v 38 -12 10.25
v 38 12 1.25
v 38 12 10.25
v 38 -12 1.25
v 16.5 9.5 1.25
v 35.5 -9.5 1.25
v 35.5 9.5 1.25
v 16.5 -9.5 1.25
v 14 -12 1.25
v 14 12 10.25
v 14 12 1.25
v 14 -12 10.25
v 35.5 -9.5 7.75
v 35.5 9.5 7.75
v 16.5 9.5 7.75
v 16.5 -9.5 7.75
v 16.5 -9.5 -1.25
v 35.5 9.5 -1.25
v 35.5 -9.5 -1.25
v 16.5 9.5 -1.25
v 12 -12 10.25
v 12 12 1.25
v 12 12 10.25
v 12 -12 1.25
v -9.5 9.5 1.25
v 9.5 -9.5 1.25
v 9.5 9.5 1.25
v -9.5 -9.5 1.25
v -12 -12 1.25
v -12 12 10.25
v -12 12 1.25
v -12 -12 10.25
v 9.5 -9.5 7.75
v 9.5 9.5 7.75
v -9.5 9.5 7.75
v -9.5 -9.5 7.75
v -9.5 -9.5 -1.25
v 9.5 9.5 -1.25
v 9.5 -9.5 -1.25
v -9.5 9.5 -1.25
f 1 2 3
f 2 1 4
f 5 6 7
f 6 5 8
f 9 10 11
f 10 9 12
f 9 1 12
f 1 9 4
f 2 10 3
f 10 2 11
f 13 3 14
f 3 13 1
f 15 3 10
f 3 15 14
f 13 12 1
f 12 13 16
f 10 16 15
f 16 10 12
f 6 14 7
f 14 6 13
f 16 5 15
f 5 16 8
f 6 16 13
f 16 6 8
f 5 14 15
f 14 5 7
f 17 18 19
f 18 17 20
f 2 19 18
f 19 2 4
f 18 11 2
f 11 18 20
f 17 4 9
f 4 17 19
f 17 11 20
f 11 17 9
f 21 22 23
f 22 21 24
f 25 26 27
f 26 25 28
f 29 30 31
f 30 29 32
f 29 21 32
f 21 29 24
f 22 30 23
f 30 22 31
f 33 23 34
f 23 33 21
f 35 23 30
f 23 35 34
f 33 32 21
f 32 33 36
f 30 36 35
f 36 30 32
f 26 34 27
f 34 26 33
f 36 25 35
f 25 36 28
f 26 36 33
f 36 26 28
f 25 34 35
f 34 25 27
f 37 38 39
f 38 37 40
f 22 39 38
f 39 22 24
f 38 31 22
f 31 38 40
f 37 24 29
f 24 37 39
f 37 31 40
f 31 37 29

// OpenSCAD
// Jotunheim 3D Print'n'Play Pieces
//   by Michael Van Biesbrouck, (c) 2019.
//   License: Attribution-NonCommercial 4.0 International
//            http://creativecommons.org/licenses/by-nc/4.0/
//
// Rules and cards available online.
//
// Site: https://sites.google.com/site/mlvanbie/jotunheim
// BGG:  https://www.boardgamegeek.com/boardgame/267571/jotunheim
//
// This file can generate many different outputs.
//
// If you are printing an entire 3D set you will need to generate
// STL files for each of the following part settings:
//   * 'frame': optional but recommended board
//   * 'blocks24': print once in brown, twice in white
//   * 'caps16': print in white
//   * 'pawns' or 'pawns_and_stand': print twice in different colours, possibly with different settings for 'facets'
//   * 'rescuer': once in blue for Hel (or twice in the previous colours but with a different number of facets)
// Before you print blocks and caps you should print 'block_test' and
// 'cap_test' to make sure that you have good settings.  (Also handy
// for replacing lost pieces.)
//
// If you are printing a frame to use with stone blocks (e.g. mosaic
// tile instead of 3D-printed blocks) then set 'size' to be the block
// width (there will be 'frame_gap' extra space) and 'height' to the
// block height.  Set the part to 'frame_test' to print out a 2x2
// matrix for a fit test.  If that works, set part to 'frame'.

// What do you want to build?
part = "block_test";            // [block_test, cap_test, frame_test, block_section, blocks24, blocks12, caps16, pawns, rescuer, frame, stand, pawns_and_stand]

// Configurable constants.
// Block width/height in mm
size = 24;                      // [20:51]
// Thickness of block wall in mm, affects bevel height.
thickness = 2.5;                // [1:0.5:3]
bevel_height = 2 * thickness;   // (2 .. 3) * thickness
// Height of pieces in mm excluding bevel.
height = 9;     // [4:30]
piece_height = height - bevel_height;              // 5 .. size/2
cap_height = height * 3 / 4;    // bevel_height+2 .. size * 3/8
// Number of sides for various pawn types.
facets = 4;                     // [4, 8, 75]
// Extra space in mm around blocks in frame.
frame_gap = 1;                  // [1:0.25:2]
// Height of frame trace in mm.
frame_height = 2;               // [1:0.5:3]
// Width of frame trace in mm.
frame_width = 2;                // [1:0.5:4]
wall_width = thickness;         // 1 .. 5; thickness is consistent if you are printing blocks 
wall_height = height;           // Change for stone blocks; 0 for no wall.
// Thickness of floor in mm, 0 for no floor.
floor_thickness = 0.6;		// [0:0.2:2]
// Width of card in mm; 66 works for 2.5in card in Maydat Perfect Fit sleeve.
stand_card_width = 66;          // [100]
// Thickness of card slot in mm, okay to leave extra space.
stand_card_thickness = 1;       // [0.6:0.2:2.0]
// Space to overlap card and stand in mm.
stand_grip = 2;                 // [1:5]
// Should there be a slot in the stand base?
stand_slot = true;

// Constants that should only be computed.
inner_size = size - 2 * thickness;
hole_size = size - 4 * thickness - frame_gap;
hole_width = size + frame_gap;
skip = frame_width+hole_width;
big = size * 10;
bar_length = hole_width+frame_width+wall_width;
eps = 0 + 0.0000000001;
board_cells = [6, 6, 4, 2];

module pyramid (hs)
{
    polyhedron(
    points=[ [hs,hs,0],[hs,-hs,0],[-hs,-hs,0],[-hs,hs,0], // the four points at base
           [0,0,hs]  ],                                 // the apex point 
    faces=[ [0,1,4],[1,2,4],[2,3,4],[3,0,4],              // each triangle side
              [1,0,3],[2,1,3] ]                         // two triangles for square base
 );
}

module block () {
    difference () {
        cube ([size, size, height], center = true);
        translate ([0, 0, -height/2]) pyramid (size/2);
        cube ([inner_size, inner_size, height], center = true);
        cube ([hole_size, hole_size, 2*height], center = true);
    }
    translate ([0, 0, height / 2])
    difference () {
        intersection () {
            cube ([size, size, bevel_height], center = true);
            translate ([0, 0, 0]) pyramid (size/2);
        }
        translate ([0, 0, -thickness]) 
            fustrum(size/2, bevel_height - thickness);
    }
}

module cap_old () {
    intersection () {
        difference () {
            cube ([size, size, cap_height], center=true);
            translate ([0, 0, -cap_height/2]) pyramid (size/2);
            cylinder (d=size-thickness*2, h=height, center=true);
        }
    }
    translate ([0, 0, cap_height/2])
        difference () {
            sphere(d=size, center=true, $fn=75);
            sphere(d=size-thickness*2, center=true);
            translate ([0, 0, -size/2])
                cube([size, size, size], center=true);
        }
}

module fustrum (fs, fh) {
    difference () {
        pyramid (fs);
        translate ([0, 0, fh]) pyramid (fs);
    }
}

module hollow_fustrum (fs, fh) {
    difference () {
        fustrum (fs, fh);
        translate ([0, 0, -thickness]) fustrum (fs, fh);
    }
}

module cap () {
    difference () {
        cube ([size, size, thickness], center=true);
        translate ([0, 0, -thickness/2]) pyramid (size/2);
        cube ([size-2*thickness, size-2*thickness, thickness*2], center=true);
    }
    translate ([0, 0, thickness/2])
        hollow_fustrum (size/2, cap_height);
}

module matrix (x, y) {
    for (i = [0:x-1]) {
        for (j = [0:y-1]) {
            translate ([i*(size+2), j*(size+2), 0]) children ();
        }
    }
}

module diamond (radius) {
    cylinder (r1=radius, r2=0, h=radius, $fn=facets, center=true);
}

module bead (s) {
    translate ([0, 0, s/4]) diamond(s/2);
    translate ([0, 0, -s/4]) rotate ([180, 0, 0]) diamond(s/2);
}

module piece (offset, flatten)
{
    bead_size = size * 3 / 4;
    difference () {
        union () {
            translate ([0, 0, thickness/2]) cylinder (d=size*3/4, h=thickness, $fn=facets, center=true);
            translate ([0, 0, thickness+offset*bead_size]) bead (bead_size);
            translate ([0, 0, thickness+(offset+0.5)*bead_size]) difference () {
                bead (bead_size);
                if (flatten) {
                    translate ([0, 0, (3/8)*bead_size+size/2]) cube (size, center=true);
                }
            }
            translate ([0, 0, thickness+(offset+1)*bead_size]) children ();
        }
        translate ([0, 0, -size/2]) cube (size, center=true);
    }
}

module rescuer () {
  piece (0, false);
}

module prize () {
    piece (0.3, true)
    translate ([0, 0, -size/8]) rotate ([180, 0, 0]) difference () {
        diamond (size/4);
        translate ([0, 0, -thickness/2]) diamond (size/4-thickness);
    }
}

module make4(radius)
{
    for (a = [0 : 3]) {
        angle = a * 90;
        translate(radius * [sin(angle), -cos(angle), 0])
            rotate([0, 0, angle])
                children();
    }
}

module bar(delta)
{
    height_change = (wall_height-floor_thickness-frame_height)/2;
    translate([delta,0,height_change]) cube([bar_length, wall_width, wall_height+floor_thickness], center=true);
}

module barPair(offset)
{
    delta = bar_length/2 + skip * offset + frame_width/2;
    bar(delta);
    bar(-delta);
}

module frame(pattern)
{
    for (i = [0:len(pattern)-1]) {
        make4(i * skip) cube([frame_width+pattern[i]*skip, frame_width, frame_height], center=true);
    }
}

module floor(pattern, thickness, tweak)
{
    for (i = [0:len(pattern)-1]) {
        make4(i * skip)
        translate ([0, 0.5*skip, 0]) cube([frame_width+pattern[i]*skip+tweak, frame_width+skip, thickness], center=true);
    }
}

module stand()
{
    difference () {
        union () {
            difference () {
                union() {
                    translate ([stand_card_width/2-stand_grip, 0, 0]) prize();
                    translate ([-stand_card_width/2+stand_grip, 0, 0]) prize();
                }
                cube ([stand_card_width-stand_grip*2-eps, big, big], center=true);
                translate ([0, 0, big/2+thickness])
                    cube ([stand_card_width, stand_card_thickness, big], center=true);
            }
            translate ([0, 0, thickness/2])
                cube ([stand_card_width-stand_grip*2, size*3/4, thickness], center=true);
        }
        if (stand_slot) cube ([stand_card_width, stand_card_thickness, thickness*2], center = true);
    }
}

if (part == "block_test") {
    translate ([size+2, 0, (height+thickness)/2])
        rotate ([180, 0, 0]) block ();
    translate ([0, 0, (height+thickness)/2])
        rotate ([180, 0, 0]) block ();
} else if (part == "cap_test") {
    translate ([0, 0, cap_height+thickness/2]) rotate ([180, 0, 0]) cap ();
} else if (part == "block_section") {
    intersection () {
       block ();
       translate ([size/2, 0, 0]) cube (size, center=true);
    }
} else if (part == "caps16") {
    matrix (4, 4) translate ([0, 0, cap_height+thickness/2]) rotate ([180, 0, 0]) cap ();
} else if (part == "blocks12" || part == "blocks24") {
    matrix (4, part == "blocks12" ? 3 : 6) translate ([0, 0, (height+thickness)/2]) rotate ([180, 0, 0]) block ();
} else if (part == "rescuer") {
    rescuer ();
} else if (part == "pawns") {
    matrix (1, 3) rescuer ();
    translate ([0, -size, 0]) prize();
} else if (part == "pawns_and_stand") {
    matrix (1, 3) rescuer ();
    translate ([0, -size, 0]) prize();
    translate ([size, 0, 0]) rotate ([0, 0, 90]) stand();
} else if (part == "frame") {
    frame(board_cells);
    if (floor_thickness > 0) translate ([0, 0, eps-(floor_thickness+frame_height)/2]) floor(board_cells, floor_thickness, 0);
    if (wall_height > 0) {
        make4(skip*3+(wall_width+frame_width)/2)  bar(0);
        for (i = [1:3]) {
            make4(skip*i+(wall_width+frame_width)/2)  barPair(3-i);
        }
    }
} else if (part == "frame_test") {
    frame([2, 2]);
} else if (part == "stand") {
    stand();
}
